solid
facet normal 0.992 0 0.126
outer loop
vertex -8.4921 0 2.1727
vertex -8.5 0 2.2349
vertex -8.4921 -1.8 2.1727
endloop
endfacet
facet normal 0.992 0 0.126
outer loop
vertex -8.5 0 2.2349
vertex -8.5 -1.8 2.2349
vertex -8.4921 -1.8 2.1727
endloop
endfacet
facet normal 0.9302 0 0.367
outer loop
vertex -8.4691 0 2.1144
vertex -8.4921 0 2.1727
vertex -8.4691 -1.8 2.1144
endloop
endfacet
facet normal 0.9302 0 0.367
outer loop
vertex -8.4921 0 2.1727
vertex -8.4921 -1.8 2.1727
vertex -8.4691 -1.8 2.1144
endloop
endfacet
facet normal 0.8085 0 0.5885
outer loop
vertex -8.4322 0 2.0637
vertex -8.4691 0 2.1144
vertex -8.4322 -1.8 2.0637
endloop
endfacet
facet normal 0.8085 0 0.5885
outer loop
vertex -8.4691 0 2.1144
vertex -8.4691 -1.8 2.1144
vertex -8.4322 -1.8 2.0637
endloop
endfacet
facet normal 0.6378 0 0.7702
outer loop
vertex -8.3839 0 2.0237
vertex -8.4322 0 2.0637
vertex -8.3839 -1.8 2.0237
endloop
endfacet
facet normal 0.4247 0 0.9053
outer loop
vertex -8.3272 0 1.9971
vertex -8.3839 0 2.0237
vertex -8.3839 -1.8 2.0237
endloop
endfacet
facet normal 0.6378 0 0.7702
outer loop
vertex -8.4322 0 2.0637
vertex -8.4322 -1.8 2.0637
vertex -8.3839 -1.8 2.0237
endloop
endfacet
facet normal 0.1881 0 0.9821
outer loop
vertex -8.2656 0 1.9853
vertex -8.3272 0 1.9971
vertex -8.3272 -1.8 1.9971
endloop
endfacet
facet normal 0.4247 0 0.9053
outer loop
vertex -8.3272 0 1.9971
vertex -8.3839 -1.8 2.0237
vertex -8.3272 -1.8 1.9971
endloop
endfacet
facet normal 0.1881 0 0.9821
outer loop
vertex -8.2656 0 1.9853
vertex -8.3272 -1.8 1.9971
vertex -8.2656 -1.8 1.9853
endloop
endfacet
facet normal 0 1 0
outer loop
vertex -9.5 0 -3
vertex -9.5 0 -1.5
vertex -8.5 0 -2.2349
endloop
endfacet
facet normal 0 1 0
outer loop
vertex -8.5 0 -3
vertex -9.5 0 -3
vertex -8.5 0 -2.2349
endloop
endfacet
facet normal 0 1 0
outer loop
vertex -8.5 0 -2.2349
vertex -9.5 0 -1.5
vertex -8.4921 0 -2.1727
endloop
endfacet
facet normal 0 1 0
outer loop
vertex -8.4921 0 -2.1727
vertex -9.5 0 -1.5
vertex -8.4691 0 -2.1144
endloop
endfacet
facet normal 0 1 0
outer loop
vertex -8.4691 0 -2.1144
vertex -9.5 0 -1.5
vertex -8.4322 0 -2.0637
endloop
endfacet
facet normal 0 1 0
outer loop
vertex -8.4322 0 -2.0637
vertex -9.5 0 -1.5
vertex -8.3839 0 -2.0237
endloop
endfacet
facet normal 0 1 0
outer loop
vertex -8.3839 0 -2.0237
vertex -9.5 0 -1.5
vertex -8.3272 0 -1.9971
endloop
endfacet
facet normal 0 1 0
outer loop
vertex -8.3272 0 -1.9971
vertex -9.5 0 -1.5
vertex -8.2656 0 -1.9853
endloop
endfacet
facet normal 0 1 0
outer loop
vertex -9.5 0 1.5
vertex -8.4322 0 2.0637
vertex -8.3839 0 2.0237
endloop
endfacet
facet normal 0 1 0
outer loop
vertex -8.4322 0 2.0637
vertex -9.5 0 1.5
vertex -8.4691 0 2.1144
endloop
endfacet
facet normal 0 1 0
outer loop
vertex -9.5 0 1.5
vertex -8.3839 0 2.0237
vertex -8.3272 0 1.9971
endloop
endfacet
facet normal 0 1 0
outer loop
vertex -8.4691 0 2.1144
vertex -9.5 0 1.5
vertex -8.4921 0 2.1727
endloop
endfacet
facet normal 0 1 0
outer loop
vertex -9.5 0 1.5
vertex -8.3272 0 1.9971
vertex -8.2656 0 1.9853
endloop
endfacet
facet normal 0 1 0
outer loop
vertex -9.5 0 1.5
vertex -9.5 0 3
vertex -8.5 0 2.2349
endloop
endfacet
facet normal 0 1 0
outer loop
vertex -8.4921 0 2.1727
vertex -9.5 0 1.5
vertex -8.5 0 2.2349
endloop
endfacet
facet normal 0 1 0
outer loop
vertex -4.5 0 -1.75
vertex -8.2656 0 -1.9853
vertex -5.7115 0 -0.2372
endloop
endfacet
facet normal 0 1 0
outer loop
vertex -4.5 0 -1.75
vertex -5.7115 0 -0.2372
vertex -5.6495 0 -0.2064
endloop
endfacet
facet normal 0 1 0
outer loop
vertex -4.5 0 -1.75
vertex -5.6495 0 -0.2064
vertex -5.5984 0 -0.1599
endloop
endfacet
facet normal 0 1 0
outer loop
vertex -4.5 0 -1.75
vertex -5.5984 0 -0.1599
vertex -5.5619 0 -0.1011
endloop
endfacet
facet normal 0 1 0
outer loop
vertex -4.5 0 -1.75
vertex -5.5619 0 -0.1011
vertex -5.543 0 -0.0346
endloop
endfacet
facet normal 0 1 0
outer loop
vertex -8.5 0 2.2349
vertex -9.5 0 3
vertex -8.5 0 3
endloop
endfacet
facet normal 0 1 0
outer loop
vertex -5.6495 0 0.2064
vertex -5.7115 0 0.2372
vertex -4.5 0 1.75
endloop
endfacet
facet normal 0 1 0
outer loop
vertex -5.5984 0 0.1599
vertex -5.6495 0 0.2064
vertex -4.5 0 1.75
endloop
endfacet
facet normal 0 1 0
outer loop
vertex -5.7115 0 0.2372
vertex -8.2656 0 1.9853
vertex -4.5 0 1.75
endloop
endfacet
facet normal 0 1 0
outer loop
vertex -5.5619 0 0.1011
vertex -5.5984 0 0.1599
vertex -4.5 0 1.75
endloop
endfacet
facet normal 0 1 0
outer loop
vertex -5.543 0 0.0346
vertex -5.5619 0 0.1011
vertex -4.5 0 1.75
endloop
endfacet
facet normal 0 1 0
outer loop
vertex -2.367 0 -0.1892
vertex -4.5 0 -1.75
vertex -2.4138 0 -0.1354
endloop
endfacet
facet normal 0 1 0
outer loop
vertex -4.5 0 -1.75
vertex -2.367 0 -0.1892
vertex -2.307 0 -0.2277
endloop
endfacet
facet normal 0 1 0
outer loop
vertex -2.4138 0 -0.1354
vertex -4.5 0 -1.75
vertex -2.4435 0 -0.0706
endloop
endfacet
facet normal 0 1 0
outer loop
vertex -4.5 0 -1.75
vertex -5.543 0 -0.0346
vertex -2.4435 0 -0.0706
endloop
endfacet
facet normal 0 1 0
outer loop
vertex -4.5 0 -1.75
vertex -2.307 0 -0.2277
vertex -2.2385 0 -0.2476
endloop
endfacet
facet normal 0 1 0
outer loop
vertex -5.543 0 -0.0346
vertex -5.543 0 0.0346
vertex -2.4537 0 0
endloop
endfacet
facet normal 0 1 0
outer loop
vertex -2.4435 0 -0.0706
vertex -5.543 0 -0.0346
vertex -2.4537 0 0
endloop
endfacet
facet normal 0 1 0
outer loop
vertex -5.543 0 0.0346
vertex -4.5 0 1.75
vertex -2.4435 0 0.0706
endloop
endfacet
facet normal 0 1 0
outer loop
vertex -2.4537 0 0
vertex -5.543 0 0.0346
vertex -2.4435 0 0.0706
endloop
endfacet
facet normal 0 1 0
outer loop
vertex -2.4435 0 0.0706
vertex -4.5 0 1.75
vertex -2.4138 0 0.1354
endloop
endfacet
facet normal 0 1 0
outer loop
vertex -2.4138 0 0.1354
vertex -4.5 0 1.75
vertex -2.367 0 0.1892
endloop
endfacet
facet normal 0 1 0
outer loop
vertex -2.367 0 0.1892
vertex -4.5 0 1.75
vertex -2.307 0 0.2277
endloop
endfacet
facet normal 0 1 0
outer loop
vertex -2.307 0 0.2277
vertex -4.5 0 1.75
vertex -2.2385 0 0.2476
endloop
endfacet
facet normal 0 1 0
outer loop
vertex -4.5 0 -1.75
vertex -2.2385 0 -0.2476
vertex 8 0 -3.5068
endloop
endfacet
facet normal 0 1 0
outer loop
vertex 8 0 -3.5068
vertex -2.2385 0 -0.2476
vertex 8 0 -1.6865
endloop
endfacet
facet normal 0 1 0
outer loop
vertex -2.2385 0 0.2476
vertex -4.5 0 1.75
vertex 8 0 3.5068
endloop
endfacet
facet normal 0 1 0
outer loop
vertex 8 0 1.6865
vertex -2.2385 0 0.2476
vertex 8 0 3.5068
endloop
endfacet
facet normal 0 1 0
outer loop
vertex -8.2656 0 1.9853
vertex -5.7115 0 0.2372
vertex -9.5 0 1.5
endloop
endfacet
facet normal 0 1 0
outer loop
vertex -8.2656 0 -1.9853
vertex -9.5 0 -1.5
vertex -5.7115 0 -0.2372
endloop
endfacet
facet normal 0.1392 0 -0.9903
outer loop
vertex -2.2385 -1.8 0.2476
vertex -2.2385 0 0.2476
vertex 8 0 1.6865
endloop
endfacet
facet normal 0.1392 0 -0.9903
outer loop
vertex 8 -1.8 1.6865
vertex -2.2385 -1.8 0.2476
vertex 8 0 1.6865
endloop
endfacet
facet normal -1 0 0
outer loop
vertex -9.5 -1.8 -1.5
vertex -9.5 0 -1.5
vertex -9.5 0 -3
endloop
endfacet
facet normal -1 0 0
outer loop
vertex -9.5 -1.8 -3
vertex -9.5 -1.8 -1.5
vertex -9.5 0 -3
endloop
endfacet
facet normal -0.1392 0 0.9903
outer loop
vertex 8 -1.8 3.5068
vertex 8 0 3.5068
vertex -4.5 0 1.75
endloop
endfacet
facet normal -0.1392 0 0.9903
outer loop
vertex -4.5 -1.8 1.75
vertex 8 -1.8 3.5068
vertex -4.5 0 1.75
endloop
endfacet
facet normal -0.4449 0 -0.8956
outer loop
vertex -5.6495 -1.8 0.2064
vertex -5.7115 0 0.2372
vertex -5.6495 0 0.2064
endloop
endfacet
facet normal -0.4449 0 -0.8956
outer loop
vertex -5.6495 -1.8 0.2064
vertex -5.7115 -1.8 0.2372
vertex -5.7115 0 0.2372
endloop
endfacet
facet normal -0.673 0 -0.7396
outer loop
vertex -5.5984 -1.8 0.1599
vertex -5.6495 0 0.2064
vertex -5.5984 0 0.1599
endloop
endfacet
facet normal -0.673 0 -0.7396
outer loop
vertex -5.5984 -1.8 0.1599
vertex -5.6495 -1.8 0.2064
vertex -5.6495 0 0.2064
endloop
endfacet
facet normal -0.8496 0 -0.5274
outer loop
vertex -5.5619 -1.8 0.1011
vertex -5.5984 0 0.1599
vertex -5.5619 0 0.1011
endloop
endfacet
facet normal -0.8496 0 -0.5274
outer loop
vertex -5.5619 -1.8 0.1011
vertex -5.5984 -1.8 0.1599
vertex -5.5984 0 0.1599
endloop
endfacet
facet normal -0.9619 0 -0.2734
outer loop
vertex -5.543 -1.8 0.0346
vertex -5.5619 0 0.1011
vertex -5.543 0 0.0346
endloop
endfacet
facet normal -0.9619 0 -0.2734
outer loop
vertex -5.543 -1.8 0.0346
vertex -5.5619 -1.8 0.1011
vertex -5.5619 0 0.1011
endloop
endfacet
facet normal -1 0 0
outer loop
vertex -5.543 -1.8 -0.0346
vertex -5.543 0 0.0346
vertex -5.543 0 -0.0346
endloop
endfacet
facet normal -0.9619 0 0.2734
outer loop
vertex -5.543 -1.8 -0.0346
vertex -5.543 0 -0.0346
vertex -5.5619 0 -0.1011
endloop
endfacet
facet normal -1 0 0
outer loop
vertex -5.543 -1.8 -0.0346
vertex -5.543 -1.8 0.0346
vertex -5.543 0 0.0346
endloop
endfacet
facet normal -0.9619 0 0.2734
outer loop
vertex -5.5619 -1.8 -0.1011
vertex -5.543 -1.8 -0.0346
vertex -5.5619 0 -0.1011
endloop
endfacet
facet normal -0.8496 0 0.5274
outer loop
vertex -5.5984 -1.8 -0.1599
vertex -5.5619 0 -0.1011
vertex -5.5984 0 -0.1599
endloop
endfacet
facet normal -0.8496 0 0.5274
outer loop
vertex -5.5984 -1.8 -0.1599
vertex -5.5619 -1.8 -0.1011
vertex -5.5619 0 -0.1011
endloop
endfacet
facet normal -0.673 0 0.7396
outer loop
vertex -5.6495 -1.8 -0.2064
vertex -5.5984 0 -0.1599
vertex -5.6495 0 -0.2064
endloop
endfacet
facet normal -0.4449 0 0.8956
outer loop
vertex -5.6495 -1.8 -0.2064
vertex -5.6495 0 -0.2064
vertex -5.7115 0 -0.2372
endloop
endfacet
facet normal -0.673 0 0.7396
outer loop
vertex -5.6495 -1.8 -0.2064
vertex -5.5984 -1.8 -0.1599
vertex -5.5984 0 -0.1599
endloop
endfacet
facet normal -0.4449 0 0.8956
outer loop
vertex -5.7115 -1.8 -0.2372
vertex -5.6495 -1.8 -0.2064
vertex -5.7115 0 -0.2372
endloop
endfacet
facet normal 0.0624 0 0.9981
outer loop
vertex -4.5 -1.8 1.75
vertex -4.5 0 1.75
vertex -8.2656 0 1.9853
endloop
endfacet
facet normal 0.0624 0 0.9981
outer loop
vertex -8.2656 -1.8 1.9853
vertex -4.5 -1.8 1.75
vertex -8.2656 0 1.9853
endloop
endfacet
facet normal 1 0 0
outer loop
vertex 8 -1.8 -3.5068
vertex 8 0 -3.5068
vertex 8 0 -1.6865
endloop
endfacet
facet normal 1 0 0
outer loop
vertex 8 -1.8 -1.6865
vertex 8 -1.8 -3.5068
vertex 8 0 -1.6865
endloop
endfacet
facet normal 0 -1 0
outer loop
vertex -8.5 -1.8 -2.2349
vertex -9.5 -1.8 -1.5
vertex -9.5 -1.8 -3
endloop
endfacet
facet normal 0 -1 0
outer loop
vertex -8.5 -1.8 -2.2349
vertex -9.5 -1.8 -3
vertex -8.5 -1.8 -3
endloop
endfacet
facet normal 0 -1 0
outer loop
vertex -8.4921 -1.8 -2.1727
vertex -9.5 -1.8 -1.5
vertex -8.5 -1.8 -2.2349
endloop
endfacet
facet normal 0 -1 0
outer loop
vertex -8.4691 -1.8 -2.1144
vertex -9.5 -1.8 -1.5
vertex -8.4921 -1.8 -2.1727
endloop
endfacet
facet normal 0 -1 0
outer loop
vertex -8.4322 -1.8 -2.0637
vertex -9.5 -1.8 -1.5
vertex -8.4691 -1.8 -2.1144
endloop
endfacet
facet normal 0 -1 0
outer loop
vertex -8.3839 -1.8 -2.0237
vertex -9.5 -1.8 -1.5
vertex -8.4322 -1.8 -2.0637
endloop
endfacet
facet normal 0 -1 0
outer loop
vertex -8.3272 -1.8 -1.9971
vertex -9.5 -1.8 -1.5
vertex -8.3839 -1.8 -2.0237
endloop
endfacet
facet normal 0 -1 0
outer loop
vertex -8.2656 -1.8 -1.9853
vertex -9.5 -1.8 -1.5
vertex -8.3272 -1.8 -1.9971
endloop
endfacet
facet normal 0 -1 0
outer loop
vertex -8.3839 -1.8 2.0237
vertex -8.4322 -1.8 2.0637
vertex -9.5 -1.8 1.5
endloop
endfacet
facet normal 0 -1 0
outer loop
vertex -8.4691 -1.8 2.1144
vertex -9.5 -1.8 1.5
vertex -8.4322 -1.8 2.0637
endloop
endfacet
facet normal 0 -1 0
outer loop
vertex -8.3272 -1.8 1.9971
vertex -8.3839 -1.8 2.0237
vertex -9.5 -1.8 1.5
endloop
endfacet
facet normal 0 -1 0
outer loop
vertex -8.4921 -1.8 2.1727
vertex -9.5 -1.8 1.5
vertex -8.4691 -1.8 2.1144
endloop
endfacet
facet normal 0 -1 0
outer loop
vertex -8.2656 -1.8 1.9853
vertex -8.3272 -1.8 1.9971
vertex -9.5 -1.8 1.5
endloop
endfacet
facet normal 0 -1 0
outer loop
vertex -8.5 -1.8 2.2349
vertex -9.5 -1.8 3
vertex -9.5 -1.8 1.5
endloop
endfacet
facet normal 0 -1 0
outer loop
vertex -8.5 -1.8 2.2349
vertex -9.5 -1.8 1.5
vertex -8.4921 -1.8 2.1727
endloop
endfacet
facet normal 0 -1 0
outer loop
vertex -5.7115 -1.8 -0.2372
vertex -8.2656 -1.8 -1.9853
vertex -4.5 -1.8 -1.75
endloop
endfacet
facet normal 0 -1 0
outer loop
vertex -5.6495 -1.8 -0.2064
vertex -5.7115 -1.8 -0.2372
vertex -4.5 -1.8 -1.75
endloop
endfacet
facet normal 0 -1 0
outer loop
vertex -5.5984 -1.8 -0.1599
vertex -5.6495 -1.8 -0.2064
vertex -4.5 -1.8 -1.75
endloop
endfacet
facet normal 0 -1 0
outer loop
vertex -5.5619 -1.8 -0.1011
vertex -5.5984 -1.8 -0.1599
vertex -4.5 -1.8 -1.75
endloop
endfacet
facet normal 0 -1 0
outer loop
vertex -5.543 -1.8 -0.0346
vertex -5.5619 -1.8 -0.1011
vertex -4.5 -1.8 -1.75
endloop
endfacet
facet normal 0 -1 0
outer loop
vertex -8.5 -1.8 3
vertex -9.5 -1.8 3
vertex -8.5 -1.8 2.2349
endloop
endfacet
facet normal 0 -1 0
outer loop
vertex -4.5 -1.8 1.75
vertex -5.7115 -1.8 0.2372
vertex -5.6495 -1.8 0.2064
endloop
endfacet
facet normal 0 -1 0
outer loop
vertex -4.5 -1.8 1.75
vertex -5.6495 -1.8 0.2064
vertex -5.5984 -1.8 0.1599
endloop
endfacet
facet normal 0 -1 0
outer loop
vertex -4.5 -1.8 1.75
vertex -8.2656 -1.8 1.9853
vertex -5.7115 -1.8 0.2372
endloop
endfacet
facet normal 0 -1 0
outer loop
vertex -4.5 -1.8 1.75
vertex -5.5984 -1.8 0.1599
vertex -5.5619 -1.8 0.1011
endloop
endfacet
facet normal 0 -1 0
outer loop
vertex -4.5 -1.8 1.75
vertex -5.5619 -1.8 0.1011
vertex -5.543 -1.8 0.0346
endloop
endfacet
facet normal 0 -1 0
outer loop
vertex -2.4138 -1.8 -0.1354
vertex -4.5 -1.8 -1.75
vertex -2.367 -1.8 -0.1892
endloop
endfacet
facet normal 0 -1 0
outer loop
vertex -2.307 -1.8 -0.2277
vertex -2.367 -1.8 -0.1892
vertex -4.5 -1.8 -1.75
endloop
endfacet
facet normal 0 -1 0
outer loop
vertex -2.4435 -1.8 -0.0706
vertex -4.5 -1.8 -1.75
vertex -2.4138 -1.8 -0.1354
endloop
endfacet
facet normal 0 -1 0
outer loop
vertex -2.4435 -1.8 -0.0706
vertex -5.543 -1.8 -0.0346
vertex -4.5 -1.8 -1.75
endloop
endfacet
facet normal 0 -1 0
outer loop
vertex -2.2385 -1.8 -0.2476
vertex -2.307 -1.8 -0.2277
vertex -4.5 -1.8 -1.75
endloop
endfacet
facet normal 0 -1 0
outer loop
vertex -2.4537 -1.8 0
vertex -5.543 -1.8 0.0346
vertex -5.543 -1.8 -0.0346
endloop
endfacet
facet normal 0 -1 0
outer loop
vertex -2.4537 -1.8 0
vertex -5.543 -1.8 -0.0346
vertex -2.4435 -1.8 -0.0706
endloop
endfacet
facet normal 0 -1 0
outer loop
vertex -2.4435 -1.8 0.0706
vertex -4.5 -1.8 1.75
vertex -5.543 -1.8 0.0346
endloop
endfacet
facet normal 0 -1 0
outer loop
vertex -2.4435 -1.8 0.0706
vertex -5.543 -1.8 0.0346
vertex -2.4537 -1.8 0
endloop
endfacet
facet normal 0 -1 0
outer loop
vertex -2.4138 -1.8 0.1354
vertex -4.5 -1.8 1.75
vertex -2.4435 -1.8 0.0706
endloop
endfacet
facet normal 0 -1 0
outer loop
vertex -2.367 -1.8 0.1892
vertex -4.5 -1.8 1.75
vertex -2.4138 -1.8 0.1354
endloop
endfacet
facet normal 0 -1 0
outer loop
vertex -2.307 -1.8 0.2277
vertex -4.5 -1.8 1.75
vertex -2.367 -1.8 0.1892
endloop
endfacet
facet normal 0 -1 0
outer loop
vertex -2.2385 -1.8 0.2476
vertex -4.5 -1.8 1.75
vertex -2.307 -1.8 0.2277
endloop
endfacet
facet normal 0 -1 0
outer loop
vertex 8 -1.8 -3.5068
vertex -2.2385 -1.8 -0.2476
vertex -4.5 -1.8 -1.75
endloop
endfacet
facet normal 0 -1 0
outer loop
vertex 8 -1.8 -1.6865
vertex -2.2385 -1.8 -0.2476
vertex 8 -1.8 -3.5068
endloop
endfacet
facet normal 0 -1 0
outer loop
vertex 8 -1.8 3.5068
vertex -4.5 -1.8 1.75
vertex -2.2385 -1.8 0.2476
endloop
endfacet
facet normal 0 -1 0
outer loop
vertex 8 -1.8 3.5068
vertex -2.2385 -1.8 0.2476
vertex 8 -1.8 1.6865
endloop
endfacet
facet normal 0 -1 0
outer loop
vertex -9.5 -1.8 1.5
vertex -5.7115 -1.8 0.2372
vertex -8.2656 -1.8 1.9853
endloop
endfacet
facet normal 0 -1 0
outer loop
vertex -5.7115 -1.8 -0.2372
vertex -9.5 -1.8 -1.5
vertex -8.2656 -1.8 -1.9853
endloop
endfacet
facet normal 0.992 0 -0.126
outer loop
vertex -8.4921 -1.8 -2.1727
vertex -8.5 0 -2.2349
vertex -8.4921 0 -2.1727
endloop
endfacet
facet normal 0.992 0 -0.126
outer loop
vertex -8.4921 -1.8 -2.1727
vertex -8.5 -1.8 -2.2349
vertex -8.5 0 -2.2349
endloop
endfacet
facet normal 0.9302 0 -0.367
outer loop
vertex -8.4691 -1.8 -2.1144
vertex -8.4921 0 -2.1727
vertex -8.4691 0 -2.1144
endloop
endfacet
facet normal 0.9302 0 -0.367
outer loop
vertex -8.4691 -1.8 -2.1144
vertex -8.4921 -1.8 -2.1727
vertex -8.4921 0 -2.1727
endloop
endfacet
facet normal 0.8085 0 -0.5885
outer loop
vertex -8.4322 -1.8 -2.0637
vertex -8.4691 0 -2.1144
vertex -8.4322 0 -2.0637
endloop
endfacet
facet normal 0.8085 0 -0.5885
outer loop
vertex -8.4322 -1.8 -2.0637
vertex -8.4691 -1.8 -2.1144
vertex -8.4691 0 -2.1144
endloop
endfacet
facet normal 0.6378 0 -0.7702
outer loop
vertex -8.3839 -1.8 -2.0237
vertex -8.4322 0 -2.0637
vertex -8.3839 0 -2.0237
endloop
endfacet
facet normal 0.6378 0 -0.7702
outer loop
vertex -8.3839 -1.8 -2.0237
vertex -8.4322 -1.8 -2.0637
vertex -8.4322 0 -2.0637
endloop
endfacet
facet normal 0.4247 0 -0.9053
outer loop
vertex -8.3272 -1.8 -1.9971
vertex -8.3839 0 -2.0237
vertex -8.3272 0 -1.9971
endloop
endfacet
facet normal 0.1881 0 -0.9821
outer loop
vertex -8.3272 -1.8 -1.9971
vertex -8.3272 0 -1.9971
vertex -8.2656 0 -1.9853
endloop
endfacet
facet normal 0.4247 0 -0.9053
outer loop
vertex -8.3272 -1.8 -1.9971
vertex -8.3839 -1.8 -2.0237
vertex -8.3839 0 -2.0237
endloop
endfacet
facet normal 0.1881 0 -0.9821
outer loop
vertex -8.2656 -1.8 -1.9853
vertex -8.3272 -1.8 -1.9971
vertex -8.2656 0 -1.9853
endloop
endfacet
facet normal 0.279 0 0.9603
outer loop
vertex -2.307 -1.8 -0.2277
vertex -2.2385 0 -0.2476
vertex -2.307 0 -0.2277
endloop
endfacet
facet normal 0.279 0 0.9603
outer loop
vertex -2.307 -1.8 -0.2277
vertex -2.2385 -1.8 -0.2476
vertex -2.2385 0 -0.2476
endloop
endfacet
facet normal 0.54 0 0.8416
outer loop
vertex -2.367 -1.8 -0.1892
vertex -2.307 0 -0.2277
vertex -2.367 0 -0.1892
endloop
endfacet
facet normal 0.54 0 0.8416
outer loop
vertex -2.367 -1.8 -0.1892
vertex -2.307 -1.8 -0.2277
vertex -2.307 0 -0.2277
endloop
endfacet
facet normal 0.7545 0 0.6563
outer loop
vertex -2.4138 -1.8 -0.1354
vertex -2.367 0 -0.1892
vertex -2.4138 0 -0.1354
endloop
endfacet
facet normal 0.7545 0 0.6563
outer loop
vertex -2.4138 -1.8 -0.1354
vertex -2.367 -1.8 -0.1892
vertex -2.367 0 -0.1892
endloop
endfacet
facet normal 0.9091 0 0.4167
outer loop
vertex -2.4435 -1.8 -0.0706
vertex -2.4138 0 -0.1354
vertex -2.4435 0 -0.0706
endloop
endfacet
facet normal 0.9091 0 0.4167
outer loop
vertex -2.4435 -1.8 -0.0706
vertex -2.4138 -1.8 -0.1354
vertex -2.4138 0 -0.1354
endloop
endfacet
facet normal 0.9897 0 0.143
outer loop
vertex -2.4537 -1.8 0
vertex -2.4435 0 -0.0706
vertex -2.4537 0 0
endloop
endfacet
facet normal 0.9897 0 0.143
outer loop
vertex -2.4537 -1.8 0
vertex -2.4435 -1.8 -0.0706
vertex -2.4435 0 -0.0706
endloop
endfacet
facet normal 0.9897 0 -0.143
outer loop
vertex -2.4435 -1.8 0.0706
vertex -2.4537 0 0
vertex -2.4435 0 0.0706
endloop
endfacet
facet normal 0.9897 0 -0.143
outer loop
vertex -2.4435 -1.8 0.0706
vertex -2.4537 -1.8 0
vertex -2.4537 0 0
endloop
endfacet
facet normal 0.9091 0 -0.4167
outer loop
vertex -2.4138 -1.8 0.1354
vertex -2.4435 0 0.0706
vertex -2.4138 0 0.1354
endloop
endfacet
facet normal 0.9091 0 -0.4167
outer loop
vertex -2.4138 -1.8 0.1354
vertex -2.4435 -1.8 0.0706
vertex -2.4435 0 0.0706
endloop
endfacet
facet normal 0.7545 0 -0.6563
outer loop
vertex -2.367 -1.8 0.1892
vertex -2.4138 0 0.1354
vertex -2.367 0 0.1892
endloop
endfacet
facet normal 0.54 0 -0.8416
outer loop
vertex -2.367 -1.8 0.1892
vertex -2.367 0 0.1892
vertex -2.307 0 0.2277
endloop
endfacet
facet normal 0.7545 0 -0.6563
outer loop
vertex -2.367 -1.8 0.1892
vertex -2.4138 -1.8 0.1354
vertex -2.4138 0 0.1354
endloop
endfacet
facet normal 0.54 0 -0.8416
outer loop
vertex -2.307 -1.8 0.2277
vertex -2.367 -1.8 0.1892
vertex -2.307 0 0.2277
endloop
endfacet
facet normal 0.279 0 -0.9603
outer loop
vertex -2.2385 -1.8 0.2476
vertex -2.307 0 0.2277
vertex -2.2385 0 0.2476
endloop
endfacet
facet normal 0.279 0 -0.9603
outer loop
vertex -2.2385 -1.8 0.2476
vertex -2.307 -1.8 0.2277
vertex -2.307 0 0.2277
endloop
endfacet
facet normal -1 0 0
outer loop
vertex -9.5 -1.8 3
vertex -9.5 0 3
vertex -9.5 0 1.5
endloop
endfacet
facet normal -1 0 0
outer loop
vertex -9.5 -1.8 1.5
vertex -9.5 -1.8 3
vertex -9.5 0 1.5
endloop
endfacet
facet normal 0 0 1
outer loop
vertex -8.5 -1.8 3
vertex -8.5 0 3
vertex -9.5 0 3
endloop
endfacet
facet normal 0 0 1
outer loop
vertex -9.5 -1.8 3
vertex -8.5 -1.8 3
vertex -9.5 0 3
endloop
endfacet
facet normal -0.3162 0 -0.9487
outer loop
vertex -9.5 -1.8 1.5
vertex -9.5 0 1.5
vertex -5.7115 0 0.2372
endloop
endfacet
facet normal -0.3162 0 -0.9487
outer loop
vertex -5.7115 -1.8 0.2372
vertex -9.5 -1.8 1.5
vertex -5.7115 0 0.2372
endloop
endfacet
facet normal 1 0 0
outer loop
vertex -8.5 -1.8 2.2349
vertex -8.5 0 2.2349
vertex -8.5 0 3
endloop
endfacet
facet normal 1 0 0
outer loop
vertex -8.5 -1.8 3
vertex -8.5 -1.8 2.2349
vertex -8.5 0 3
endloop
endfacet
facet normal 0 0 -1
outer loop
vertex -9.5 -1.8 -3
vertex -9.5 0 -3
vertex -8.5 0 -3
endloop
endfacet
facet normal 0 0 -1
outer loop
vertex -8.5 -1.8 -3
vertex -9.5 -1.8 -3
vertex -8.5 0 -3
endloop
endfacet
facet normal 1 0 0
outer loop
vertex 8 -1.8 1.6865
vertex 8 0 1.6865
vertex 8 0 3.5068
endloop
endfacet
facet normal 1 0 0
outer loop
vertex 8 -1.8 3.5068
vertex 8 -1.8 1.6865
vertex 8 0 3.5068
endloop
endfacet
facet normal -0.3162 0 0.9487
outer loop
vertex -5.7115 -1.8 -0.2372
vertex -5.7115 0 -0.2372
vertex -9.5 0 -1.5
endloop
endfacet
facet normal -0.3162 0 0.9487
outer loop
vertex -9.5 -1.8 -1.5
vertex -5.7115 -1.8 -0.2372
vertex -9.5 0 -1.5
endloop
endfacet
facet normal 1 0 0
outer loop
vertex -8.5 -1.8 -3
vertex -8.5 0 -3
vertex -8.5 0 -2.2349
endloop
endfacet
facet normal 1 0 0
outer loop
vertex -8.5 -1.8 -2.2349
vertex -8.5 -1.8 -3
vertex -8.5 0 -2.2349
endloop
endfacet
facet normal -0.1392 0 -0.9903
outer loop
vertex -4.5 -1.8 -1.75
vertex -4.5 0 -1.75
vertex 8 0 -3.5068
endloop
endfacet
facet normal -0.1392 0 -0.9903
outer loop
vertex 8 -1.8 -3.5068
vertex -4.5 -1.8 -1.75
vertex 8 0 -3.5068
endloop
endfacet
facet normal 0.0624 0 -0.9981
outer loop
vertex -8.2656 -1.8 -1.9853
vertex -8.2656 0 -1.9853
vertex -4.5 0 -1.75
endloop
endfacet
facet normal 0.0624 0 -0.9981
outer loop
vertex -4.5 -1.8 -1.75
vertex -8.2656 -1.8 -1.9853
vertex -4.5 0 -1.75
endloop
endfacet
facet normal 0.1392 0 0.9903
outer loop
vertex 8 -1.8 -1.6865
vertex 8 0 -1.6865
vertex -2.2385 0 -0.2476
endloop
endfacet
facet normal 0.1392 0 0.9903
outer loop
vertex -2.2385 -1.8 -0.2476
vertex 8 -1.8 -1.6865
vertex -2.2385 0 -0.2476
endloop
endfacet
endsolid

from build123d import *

# Parameters (mm, degrees)
F1_DEPTH = 1.8
F2_R     = 0.25
F3_R     = 0.25


with BuildPart() as f1:
    # F0 (on Front) → F1 (new body)
    with BuildSketch(Plane.XZ):
        Polygon((8, 3.50676), (-4.5, 1.75), (-8.5, 2), (-8.5, 3), (-9.5, 3), (-9.5, 1.5), (-5, 0), (-9.5, -1.5), (-9.5, -3), (-8.5, -3), (-8.5, -2), (-4.5, -1.75), (8, -3.50676), (8, -1.68649), (-4, 0), (8, 1.68649), align=None)
    extrude(amount=F1_DEPTH)

    # F2
    f2_edges = [f1.edges().sort_by_distance(p)[0] for p in [
        (-4, -0.9, 0),
        (-5, -0.9, 0),
    ]]
    fillet(f2_edges, radius=F2_R)

    # F3
    f3_edges = [f1.edges().sort_by_distance(p)[0] for p in [
        (-8.5, -0.9, 2),
        (-8.5, -0.9, -2),
    ]]
    fillet(f3_edges, radius=F3_R)


solid = f1.part
